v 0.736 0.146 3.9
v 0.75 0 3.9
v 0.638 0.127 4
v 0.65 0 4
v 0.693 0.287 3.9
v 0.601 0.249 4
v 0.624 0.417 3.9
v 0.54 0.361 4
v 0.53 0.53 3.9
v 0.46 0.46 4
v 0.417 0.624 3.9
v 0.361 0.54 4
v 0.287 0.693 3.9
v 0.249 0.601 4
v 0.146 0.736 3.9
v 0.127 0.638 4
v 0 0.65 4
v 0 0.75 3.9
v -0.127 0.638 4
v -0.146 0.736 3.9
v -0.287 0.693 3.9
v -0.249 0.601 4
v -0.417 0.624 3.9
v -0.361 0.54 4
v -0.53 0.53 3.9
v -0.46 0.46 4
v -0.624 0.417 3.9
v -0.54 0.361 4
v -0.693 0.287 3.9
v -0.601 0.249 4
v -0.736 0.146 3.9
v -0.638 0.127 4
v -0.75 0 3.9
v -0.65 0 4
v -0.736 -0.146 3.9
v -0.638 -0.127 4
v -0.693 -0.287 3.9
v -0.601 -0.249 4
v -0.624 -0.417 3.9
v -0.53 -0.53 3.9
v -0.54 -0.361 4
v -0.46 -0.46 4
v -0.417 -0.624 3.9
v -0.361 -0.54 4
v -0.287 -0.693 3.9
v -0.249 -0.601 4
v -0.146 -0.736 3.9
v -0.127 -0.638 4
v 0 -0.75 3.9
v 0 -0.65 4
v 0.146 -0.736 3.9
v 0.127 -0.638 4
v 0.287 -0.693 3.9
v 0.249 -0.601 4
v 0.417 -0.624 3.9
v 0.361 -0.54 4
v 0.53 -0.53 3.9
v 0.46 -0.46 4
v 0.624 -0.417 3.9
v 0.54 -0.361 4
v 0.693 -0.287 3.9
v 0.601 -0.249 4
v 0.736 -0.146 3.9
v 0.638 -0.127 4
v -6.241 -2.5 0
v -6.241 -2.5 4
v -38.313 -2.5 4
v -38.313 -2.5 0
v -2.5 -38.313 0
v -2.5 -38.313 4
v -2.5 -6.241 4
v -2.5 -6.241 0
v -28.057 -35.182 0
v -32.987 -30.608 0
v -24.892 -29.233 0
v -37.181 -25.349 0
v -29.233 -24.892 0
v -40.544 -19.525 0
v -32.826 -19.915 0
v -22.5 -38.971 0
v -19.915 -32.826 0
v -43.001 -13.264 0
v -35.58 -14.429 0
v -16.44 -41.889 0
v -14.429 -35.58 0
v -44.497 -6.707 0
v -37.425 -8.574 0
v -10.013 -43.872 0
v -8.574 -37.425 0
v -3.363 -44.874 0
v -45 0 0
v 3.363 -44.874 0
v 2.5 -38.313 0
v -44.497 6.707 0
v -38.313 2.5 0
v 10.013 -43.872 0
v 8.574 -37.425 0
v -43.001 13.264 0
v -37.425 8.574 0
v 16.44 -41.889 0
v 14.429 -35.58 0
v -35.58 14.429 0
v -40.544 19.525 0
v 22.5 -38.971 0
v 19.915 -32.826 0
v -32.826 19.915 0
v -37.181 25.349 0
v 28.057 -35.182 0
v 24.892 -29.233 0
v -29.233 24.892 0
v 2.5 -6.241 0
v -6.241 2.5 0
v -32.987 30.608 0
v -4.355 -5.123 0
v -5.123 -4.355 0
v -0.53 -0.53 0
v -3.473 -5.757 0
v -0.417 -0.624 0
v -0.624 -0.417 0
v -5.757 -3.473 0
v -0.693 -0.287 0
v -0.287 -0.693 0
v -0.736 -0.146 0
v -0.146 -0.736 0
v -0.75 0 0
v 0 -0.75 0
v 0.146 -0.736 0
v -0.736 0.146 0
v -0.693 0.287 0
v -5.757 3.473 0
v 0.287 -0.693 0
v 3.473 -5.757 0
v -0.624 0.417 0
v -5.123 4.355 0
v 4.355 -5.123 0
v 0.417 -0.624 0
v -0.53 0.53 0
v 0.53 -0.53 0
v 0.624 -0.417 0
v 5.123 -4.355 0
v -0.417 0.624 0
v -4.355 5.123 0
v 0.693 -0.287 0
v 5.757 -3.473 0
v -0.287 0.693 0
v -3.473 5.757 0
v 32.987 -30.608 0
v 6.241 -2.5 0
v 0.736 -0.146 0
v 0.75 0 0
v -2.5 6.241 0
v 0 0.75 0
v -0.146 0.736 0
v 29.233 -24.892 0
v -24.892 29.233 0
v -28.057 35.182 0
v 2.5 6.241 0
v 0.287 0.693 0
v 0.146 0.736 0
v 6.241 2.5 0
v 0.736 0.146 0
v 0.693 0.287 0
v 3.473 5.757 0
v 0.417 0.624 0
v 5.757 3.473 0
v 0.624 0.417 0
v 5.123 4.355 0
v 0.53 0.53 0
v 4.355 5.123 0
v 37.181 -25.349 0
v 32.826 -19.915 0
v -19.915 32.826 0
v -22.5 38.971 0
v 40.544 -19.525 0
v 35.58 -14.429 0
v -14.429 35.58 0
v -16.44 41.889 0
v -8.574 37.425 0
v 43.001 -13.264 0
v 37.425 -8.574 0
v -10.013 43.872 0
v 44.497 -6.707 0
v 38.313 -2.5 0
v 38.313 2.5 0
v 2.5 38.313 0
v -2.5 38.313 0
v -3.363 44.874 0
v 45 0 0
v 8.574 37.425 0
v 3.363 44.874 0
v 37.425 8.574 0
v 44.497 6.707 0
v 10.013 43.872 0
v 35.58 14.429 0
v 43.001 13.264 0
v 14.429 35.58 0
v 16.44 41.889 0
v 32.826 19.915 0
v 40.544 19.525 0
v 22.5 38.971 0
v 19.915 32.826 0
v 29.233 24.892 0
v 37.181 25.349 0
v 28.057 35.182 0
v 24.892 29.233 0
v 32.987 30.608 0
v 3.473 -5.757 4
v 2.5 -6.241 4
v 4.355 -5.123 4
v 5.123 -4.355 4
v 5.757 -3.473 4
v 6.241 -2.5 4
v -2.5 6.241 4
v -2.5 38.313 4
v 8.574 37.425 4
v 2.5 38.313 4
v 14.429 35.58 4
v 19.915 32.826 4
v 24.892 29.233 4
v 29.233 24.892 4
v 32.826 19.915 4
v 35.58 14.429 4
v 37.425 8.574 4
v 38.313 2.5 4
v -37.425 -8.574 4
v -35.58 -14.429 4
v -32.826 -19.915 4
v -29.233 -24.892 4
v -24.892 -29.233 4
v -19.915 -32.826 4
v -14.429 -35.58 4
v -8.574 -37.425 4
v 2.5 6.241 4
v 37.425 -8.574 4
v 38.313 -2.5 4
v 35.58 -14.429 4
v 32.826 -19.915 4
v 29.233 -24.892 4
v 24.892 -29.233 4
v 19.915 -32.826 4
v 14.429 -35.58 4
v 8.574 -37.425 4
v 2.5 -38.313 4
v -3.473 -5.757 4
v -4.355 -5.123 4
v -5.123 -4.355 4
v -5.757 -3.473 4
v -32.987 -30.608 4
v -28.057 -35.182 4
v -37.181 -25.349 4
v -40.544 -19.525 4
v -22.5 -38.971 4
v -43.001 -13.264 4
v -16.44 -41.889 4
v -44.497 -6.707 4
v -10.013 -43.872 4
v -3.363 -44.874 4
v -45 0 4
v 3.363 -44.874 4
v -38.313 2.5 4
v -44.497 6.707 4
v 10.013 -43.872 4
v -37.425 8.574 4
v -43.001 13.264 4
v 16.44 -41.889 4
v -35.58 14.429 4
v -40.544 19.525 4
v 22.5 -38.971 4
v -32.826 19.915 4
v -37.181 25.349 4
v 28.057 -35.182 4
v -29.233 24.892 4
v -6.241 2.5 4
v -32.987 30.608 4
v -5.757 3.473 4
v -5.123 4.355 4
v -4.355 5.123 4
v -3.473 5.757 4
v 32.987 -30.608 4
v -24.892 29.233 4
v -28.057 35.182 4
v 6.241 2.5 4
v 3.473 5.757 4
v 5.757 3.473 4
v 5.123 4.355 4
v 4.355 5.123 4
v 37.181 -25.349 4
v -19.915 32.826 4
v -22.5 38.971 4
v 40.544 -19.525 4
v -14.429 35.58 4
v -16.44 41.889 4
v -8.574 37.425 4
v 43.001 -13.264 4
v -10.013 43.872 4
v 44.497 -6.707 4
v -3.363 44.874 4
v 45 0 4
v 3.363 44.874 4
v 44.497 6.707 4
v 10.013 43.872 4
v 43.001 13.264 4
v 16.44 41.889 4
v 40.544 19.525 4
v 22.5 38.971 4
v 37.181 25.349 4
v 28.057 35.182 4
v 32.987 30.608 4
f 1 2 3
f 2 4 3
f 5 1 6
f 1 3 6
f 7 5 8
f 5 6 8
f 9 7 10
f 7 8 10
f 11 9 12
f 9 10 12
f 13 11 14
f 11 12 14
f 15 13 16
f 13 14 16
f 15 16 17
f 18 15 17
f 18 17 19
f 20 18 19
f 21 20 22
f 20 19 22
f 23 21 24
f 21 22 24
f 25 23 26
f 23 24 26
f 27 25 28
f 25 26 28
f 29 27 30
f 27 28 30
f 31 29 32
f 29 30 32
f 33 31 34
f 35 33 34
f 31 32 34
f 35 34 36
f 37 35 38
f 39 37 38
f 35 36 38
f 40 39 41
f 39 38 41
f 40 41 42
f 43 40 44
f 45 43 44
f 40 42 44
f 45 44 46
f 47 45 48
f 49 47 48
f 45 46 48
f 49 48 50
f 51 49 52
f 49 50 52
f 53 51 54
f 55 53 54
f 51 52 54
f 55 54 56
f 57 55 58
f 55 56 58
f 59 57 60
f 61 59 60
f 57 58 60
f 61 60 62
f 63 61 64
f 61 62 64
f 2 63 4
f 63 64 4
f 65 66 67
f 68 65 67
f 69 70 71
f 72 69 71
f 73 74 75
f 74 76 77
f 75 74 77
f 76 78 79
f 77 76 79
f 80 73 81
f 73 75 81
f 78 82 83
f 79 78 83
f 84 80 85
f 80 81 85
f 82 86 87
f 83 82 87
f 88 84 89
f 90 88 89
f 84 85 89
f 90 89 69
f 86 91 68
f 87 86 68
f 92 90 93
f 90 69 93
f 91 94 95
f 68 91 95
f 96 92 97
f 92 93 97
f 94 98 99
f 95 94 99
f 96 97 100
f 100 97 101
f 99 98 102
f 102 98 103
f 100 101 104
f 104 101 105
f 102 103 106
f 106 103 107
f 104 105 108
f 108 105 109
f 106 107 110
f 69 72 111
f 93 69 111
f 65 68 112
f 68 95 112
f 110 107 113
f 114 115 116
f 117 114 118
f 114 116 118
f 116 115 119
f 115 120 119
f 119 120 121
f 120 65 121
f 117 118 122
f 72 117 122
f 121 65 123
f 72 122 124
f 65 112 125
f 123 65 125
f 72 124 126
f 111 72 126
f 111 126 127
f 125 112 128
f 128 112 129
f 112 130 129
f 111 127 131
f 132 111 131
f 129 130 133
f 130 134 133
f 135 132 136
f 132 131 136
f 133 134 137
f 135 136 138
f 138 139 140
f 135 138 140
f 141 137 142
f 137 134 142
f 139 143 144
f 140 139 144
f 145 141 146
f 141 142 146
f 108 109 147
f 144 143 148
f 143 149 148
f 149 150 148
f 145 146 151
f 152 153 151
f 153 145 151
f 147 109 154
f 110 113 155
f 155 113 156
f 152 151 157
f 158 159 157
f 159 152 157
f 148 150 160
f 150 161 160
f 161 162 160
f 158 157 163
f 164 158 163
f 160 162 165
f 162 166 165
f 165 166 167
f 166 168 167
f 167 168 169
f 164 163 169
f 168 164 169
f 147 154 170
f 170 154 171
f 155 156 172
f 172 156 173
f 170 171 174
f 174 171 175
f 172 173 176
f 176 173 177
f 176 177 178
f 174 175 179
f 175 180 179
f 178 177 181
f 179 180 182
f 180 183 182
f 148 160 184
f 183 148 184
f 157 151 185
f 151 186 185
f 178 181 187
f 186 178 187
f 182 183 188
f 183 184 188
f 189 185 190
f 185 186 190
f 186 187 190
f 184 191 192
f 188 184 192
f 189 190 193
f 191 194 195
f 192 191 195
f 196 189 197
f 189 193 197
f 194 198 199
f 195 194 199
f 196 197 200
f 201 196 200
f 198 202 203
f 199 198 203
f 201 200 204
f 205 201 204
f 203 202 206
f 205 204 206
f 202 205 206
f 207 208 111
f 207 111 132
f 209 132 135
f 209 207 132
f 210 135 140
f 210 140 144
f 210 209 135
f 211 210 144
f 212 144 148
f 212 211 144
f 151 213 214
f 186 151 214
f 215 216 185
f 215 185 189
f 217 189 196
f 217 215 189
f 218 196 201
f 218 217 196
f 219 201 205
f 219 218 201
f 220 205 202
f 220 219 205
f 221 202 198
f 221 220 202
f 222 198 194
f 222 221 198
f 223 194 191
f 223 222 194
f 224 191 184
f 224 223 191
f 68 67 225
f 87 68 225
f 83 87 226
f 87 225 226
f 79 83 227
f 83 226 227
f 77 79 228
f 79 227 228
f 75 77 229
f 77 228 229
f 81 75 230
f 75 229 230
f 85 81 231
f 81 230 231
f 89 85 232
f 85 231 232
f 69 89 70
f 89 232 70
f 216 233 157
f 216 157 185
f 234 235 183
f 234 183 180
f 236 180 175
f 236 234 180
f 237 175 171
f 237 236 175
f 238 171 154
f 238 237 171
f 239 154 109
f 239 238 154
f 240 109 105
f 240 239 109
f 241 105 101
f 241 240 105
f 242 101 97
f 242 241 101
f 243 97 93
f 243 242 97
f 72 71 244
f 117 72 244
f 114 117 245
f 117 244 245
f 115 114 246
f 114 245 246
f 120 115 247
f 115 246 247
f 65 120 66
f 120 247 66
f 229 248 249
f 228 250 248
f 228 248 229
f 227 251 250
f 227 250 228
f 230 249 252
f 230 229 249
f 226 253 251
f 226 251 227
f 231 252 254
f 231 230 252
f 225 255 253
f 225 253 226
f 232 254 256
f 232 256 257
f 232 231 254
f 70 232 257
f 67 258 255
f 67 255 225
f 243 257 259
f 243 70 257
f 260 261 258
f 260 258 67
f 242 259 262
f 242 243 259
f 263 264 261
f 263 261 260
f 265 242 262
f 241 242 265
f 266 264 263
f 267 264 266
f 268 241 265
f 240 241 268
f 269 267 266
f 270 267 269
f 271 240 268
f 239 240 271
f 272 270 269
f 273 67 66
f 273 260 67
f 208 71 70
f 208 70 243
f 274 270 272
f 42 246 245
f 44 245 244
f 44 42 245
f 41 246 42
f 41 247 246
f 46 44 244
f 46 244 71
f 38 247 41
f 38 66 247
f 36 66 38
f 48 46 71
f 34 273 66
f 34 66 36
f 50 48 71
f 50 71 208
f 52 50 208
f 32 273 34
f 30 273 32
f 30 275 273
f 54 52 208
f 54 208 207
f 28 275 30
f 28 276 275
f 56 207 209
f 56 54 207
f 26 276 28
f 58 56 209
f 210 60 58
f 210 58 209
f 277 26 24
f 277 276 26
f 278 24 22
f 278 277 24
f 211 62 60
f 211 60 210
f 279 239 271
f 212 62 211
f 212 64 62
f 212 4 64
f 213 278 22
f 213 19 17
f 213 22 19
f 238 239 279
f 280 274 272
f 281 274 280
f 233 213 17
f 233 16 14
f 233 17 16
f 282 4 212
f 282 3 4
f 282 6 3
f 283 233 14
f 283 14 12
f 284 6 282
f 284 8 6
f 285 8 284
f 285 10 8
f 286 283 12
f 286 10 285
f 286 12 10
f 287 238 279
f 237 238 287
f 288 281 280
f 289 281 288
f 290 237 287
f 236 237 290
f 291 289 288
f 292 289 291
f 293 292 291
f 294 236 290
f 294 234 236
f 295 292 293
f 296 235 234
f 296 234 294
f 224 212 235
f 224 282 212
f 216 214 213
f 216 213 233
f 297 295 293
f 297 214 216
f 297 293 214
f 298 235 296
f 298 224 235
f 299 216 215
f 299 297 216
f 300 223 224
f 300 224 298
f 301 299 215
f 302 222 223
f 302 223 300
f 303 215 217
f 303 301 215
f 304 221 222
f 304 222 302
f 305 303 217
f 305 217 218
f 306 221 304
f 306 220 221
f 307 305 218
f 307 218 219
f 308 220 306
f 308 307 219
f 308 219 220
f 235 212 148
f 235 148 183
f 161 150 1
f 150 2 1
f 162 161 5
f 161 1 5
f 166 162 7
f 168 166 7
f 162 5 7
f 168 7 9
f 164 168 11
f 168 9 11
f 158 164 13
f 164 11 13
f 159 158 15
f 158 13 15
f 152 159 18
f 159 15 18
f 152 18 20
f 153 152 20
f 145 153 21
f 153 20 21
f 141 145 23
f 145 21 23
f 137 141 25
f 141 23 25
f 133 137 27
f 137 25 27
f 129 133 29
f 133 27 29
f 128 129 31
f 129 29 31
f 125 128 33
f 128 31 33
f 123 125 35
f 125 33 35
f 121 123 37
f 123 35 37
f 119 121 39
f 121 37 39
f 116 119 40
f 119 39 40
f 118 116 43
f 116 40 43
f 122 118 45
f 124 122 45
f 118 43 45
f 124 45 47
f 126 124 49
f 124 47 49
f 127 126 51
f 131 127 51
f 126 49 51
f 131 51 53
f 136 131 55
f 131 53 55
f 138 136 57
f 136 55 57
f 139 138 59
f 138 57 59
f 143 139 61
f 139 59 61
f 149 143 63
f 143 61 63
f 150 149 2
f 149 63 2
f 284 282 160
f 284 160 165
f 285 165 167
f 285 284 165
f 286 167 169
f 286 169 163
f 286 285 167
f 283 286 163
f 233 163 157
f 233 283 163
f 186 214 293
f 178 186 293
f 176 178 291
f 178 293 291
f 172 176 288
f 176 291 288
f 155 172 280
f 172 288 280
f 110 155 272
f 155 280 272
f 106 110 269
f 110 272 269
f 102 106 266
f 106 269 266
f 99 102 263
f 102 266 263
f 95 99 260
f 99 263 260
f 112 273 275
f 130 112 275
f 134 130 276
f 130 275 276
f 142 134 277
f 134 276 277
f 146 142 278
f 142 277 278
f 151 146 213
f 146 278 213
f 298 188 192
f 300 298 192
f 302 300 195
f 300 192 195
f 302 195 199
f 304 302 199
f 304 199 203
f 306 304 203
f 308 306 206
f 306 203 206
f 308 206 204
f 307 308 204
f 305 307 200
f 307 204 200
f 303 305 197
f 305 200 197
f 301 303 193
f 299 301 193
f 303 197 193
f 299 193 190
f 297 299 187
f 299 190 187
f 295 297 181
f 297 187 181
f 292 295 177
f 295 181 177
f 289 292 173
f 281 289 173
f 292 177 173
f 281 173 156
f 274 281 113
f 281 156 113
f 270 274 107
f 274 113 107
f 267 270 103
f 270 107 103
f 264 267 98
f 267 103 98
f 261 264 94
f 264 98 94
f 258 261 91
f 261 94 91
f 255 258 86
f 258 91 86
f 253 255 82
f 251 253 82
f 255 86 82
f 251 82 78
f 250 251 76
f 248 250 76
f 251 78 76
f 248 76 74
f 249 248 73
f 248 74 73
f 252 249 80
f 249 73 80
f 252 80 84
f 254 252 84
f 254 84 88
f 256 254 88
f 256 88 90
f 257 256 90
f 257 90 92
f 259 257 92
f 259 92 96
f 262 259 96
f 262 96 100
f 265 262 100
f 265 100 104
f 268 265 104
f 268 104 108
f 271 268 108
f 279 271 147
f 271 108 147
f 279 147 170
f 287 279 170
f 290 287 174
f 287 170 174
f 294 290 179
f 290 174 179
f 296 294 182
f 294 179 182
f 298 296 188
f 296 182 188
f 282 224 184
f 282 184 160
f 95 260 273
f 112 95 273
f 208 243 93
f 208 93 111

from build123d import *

# Parameters (mm, degrees)
SKETCH1_R           = 45
BOSS_EXTRUDE1_DEPTH = 4
CUT_EXTRUDE1_DEPTH  = 64.765194268


# Read off the part's stored shape, not the designer's step: Cavity1
with BuildPart() as part:
    # Sketch1 → Boss-Extrude1 (new body)
    with BuildSketch(Plane.XY):
        Circle(SKETCH1_R)
    extrude(amount=BOSS_EXTRUDE1_DEPTH)

    # Cavity1 outline → Cavity1 (revolve, cut)
    with BuildSketch(Plane.XZ):
        Polygon((0.75, 0), (0.75, 3.9), (0.65, 4), (0, 4), (0, 0), align=None)
    revolve(axis=Axis((0, 0, 0), (0, 0, 1)), mode=Mode.SUBTRACT)

    # Sketch2 → Cut-Extrude1 (cut, through all)
    with BuildSketch(Plane.XY.offset(4)):
        with BuildLine():
            Line((2.5, 6.241391614), (2.5, 38.313254027))
            ThreePointArc((2.5, 38.313254027), (27.149175256, 27.149175256), (38.313254027, 2.5))
            Line((38.313254027, 2.5), (6.241391614, 2.5))
            ThreePointArc((6.241391614, 2.5), (4.754207047, 4.754207047), (2.5, 6.241391614))
        make_face()
        with BuildLine():
            Line((-2.5, -38.313254027), (-2.5, -6.241391614))
            ThreePointArc((-2.5, -6.241391614), (-4.754207047, -4.754207047), (-6.241391614, -2.5))
            Line((-6.241391614, -2.5), (-38.313254027, -2.5))
            ThreePointArc((-38.313254027, -2.5), (-27.149175256, -27.149175256), (-2.5, -38.313254027))
        make_face()
        with BuildLine():
            Line((2.5, -38.313254027), (2.5, -6.241391614))
            ThreePointArc((2.5, -6.241391614), (4.754207047, -4.754207047), (6.241391614, -2.5))
            Line((6.241391614, -2.5), (38.313254027, -2.5))
            ThreePointArc((38.313254027, -2.5), (27.149175256, -27.149175256), (2.5, -38.313254027))
        make_face()
        with BuildLine():
            Line((-2.5, 6.241391614), (-2.5, 38.313254027))
            ThreePointArc((-2.5, 38.313254027), (-27.149175256, 27.149175256), (-38.313254027, 2.5))
            Line((-38.313254027, 2.5), (-6.241391614, 2.5))
            ThreePointArc((-6.241391614, 2.5), (-4.754207047, 4.754207047), (-2.5, 6.241391614))
        make_face()
    extrude(amount=-CUT_EXTRUDE1_DEPTH, mode=Mode.SUBTRACT)


solid = part.part
